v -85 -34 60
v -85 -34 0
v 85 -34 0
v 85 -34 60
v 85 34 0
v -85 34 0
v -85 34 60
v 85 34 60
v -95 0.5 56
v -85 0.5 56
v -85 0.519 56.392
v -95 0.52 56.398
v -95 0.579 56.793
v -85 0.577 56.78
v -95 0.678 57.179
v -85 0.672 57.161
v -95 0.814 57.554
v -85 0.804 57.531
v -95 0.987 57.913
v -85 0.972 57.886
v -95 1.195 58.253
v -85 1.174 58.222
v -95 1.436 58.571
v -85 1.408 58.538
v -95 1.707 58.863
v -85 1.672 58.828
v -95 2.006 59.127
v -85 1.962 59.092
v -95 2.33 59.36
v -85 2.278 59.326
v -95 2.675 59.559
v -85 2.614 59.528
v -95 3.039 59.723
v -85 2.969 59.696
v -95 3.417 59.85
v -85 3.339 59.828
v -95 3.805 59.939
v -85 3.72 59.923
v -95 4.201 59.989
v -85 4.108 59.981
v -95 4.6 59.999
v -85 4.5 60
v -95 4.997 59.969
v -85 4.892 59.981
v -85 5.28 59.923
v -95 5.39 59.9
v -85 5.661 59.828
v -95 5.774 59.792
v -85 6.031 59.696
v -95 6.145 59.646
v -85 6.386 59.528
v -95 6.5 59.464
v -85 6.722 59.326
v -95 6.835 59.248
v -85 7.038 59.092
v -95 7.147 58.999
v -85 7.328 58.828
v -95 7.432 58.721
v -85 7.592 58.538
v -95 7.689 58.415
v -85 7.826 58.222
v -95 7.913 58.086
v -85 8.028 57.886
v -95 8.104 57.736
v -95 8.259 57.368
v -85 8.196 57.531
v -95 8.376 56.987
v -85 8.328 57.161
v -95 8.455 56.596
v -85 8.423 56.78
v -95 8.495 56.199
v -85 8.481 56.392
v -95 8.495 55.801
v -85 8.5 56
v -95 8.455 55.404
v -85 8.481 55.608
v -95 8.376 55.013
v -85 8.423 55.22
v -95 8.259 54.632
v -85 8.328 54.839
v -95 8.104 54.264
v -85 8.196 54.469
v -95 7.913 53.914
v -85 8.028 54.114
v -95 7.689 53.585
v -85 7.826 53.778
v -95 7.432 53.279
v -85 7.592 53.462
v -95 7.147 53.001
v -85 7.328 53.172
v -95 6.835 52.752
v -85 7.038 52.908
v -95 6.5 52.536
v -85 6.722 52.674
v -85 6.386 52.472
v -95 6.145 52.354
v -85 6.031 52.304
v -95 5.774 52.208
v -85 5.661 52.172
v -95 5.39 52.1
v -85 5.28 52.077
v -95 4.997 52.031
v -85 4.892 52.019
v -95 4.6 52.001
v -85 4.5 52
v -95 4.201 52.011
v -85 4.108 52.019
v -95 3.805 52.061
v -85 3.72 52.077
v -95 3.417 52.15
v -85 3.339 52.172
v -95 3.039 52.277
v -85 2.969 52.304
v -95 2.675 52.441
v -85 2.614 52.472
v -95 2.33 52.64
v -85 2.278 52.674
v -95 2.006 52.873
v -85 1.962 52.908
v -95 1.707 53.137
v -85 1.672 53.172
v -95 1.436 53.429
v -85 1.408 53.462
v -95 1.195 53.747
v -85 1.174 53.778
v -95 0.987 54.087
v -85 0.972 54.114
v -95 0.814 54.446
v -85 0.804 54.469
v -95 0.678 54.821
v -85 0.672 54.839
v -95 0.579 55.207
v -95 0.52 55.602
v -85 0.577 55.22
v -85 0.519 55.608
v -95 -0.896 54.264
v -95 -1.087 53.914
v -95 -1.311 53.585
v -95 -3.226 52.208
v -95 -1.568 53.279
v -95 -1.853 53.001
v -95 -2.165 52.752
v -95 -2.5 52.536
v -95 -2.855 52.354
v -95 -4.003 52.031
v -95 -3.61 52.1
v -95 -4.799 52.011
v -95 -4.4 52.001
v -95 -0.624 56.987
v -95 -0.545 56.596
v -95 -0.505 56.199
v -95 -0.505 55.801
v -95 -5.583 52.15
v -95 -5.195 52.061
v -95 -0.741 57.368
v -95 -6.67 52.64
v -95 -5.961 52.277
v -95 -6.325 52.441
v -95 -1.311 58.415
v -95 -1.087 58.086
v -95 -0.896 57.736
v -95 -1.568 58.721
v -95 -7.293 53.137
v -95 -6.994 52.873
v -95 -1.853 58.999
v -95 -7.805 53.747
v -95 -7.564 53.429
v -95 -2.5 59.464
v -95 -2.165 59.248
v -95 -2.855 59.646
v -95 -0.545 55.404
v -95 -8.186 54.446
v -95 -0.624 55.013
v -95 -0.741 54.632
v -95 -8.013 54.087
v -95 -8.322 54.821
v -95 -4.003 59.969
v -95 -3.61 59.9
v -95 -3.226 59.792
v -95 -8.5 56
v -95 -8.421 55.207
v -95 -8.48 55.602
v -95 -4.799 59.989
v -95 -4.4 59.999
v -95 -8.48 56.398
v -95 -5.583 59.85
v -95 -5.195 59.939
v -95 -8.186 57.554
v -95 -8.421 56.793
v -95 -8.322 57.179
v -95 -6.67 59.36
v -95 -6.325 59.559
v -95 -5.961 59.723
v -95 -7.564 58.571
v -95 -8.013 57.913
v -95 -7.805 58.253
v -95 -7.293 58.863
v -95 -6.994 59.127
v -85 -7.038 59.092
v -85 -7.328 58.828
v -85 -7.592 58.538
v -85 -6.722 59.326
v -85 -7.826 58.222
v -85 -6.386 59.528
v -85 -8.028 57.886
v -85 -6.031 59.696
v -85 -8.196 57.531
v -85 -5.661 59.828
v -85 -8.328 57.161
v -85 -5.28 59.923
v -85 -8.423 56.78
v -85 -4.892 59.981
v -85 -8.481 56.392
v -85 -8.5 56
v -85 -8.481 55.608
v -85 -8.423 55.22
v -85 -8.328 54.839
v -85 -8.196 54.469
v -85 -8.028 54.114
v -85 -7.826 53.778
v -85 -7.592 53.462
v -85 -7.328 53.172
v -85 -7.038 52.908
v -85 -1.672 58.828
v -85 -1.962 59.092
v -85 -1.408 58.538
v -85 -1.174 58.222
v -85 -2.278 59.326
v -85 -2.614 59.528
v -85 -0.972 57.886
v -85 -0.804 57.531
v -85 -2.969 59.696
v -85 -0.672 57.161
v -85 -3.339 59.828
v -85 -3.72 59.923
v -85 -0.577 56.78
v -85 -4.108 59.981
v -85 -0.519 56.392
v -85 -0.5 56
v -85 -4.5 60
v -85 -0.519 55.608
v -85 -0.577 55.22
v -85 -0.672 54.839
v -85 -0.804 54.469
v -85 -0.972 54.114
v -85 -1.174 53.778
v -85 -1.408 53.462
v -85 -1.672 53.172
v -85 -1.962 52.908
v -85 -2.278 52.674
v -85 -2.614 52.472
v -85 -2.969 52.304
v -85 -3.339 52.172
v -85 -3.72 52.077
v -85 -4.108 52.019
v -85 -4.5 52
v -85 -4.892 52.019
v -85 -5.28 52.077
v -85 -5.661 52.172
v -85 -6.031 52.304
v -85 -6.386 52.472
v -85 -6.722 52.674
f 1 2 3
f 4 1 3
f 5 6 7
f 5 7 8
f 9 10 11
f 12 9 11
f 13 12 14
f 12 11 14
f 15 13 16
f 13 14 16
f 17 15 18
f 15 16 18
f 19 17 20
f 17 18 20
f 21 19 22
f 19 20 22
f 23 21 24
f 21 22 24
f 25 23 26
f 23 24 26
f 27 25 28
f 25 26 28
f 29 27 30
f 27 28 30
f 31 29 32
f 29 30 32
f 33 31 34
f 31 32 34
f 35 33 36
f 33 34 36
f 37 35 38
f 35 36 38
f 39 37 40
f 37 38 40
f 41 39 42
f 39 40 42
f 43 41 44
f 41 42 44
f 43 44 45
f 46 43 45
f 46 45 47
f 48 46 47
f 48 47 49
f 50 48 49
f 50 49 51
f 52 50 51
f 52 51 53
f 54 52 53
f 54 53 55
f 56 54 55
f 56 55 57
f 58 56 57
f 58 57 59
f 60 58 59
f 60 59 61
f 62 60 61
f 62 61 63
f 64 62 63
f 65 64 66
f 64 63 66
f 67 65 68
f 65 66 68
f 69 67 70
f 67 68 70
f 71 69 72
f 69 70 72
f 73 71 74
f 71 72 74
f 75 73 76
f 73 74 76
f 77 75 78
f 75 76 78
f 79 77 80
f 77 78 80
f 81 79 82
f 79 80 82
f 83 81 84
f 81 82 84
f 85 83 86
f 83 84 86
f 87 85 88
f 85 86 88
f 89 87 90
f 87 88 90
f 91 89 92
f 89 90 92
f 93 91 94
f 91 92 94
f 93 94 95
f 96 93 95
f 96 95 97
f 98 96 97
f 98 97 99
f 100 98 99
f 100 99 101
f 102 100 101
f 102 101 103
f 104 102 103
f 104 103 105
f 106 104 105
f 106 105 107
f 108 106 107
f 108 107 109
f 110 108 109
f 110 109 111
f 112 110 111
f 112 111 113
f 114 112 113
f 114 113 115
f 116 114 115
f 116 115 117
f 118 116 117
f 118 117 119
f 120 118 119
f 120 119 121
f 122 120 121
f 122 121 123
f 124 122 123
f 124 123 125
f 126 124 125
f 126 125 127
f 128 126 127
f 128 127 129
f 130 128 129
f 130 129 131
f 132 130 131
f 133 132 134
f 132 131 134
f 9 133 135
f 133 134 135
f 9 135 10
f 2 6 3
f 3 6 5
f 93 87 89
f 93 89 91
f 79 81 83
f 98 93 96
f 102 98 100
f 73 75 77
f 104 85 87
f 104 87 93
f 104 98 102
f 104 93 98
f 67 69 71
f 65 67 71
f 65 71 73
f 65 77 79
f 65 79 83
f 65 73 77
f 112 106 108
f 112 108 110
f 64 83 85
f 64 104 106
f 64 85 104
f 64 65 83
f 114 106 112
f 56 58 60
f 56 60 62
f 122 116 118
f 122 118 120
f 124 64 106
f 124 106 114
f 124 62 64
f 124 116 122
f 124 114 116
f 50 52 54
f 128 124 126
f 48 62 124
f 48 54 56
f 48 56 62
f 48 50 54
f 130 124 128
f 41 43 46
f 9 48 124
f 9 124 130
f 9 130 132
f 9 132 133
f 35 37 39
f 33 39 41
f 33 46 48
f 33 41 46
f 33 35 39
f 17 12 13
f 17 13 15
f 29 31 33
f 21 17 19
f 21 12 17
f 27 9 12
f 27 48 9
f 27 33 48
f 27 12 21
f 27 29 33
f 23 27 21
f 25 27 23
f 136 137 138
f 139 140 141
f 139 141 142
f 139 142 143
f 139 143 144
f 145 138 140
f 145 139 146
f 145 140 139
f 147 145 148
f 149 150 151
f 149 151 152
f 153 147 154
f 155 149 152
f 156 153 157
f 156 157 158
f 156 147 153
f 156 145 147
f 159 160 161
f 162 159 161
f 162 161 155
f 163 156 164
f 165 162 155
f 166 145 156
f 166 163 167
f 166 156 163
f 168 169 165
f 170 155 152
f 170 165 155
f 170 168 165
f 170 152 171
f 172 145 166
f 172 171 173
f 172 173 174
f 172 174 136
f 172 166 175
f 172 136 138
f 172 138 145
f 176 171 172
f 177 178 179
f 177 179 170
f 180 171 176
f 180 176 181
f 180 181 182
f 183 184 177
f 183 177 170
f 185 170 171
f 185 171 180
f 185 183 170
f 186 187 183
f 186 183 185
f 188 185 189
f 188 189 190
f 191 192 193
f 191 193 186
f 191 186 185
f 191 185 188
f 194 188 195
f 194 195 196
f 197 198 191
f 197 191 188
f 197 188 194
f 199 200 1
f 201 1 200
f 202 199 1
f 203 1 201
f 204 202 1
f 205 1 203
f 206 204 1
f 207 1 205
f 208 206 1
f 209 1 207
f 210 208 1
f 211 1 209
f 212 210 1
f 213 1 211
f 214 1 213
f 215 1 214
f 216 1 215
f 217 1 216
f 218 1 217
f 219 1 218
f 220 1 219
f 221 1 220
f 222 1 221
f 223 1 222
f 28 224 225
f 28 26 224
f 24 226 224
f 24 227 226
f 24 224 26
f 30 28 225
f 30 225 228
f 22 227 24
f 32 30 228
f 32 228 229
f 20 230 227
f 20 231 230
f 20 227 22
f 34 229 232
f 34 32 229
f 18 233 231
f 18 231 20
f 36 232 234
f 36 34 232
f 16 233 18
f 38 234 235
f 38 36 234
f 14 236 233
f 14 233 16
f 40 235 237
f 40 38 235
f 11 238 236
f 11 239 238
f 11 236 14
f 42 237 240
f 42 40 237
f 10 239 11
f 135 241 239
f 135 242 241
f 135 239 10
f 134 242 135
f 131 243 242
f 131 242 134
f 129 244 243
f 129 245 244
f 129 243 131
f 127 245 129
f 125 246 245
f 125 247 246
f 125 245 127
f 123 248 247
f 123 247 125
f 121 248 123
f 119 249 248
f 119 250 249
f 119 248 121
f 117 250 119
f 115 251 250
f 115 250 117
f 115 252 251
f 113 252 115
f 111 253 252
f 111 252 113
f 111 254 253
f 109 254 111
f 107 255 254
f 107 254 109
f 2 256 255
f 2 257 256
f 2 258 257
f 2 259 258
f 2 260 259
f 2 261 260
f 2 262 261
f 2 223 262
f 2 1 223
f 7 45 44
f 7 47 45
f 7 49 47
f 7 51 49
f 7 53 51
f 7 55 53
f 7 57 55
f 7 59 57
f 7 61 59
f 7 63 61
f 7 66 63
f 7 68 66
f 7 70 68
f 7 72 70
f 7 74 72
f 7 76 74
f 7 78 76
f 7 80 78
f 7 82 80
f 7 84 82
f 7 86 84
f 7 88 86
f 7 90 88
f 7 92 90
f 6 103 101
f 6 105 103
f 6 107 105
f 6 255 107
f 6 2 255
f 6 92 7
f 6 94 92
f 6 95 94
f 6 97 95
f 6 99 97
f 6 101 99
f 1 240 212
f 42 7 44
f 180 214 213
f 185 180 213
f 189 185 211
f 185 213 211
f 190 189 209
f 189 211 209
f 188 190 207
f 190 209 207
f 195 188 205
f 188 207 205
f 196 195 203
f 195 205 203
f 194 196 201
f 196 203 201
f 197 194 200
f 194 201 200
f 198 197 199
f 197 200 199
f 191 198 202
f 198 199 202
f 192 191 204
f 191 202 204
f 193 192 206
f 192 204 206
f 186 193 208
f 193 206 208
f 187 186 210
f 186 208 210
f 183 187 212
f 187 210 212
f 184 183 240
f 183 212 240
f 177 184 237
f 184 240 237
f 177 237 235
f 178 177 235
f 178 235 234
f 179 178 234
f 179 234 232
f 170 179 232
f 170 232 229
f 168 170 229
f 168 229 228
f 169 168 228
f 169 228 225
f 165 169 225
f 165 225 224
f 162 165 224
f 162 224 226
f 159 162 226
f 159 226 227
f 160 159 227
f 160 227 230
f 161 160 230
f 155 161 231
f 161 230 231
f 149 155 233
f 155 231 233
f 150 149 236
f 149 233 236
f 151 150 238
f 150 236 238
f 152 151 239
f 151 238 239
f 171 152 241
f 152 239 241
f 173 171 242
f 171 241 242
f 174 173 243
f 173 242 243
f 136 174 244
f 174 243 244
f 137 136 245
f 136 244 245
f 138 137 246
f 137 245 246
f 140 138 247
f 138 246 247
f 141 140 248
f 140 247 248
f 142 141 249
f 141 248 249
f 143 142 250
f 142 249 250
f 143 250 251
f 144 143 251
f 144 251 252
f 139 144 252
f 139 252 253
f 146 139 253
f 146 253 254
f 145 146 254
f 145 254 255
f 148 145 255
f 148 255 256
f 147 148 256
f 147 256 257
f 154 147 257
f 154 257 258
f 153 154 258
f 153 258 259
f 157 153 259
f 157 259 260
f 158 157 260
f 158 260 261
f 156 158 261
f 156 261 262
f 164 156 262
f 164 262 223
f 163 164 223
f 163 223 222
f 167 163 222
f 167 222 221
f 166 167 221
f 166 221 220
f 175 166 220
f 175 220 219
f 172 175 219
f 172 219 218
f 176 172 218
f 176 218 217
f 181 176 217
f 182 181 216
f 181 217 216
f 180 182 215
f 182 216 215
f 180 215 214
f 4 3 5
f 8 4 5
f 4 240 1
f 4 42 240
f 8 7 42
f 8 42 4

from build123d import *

# Parameters (mm, degrees)
F0_W     = 170
F0_H     = 68
F1_DEPTH = 60
F2_R     = 4
F3_DEPTH = 10


with BuildPart() as f1:
    # F0 (on Top) → F1 (new body)
    with BuildSketch(Plane.XY):
        Rectangle(F0_W, F0_H)
    extrude(amount=F1_DEPTH)

    # F2 (on face) → F3 (join)
    with BuildSketch(Plane(origin=(-85, 0, 0), x_dir=(0, -1, 0), z_dir=(-1, 0, 0))):
        with Locations((4.5, 56)):
            Circle(F2_R)
        with Locations((-4.5, 56)):
            Circle(F2_R)
    extrude(amount=F3_DEPTH)


solid = f1.part
